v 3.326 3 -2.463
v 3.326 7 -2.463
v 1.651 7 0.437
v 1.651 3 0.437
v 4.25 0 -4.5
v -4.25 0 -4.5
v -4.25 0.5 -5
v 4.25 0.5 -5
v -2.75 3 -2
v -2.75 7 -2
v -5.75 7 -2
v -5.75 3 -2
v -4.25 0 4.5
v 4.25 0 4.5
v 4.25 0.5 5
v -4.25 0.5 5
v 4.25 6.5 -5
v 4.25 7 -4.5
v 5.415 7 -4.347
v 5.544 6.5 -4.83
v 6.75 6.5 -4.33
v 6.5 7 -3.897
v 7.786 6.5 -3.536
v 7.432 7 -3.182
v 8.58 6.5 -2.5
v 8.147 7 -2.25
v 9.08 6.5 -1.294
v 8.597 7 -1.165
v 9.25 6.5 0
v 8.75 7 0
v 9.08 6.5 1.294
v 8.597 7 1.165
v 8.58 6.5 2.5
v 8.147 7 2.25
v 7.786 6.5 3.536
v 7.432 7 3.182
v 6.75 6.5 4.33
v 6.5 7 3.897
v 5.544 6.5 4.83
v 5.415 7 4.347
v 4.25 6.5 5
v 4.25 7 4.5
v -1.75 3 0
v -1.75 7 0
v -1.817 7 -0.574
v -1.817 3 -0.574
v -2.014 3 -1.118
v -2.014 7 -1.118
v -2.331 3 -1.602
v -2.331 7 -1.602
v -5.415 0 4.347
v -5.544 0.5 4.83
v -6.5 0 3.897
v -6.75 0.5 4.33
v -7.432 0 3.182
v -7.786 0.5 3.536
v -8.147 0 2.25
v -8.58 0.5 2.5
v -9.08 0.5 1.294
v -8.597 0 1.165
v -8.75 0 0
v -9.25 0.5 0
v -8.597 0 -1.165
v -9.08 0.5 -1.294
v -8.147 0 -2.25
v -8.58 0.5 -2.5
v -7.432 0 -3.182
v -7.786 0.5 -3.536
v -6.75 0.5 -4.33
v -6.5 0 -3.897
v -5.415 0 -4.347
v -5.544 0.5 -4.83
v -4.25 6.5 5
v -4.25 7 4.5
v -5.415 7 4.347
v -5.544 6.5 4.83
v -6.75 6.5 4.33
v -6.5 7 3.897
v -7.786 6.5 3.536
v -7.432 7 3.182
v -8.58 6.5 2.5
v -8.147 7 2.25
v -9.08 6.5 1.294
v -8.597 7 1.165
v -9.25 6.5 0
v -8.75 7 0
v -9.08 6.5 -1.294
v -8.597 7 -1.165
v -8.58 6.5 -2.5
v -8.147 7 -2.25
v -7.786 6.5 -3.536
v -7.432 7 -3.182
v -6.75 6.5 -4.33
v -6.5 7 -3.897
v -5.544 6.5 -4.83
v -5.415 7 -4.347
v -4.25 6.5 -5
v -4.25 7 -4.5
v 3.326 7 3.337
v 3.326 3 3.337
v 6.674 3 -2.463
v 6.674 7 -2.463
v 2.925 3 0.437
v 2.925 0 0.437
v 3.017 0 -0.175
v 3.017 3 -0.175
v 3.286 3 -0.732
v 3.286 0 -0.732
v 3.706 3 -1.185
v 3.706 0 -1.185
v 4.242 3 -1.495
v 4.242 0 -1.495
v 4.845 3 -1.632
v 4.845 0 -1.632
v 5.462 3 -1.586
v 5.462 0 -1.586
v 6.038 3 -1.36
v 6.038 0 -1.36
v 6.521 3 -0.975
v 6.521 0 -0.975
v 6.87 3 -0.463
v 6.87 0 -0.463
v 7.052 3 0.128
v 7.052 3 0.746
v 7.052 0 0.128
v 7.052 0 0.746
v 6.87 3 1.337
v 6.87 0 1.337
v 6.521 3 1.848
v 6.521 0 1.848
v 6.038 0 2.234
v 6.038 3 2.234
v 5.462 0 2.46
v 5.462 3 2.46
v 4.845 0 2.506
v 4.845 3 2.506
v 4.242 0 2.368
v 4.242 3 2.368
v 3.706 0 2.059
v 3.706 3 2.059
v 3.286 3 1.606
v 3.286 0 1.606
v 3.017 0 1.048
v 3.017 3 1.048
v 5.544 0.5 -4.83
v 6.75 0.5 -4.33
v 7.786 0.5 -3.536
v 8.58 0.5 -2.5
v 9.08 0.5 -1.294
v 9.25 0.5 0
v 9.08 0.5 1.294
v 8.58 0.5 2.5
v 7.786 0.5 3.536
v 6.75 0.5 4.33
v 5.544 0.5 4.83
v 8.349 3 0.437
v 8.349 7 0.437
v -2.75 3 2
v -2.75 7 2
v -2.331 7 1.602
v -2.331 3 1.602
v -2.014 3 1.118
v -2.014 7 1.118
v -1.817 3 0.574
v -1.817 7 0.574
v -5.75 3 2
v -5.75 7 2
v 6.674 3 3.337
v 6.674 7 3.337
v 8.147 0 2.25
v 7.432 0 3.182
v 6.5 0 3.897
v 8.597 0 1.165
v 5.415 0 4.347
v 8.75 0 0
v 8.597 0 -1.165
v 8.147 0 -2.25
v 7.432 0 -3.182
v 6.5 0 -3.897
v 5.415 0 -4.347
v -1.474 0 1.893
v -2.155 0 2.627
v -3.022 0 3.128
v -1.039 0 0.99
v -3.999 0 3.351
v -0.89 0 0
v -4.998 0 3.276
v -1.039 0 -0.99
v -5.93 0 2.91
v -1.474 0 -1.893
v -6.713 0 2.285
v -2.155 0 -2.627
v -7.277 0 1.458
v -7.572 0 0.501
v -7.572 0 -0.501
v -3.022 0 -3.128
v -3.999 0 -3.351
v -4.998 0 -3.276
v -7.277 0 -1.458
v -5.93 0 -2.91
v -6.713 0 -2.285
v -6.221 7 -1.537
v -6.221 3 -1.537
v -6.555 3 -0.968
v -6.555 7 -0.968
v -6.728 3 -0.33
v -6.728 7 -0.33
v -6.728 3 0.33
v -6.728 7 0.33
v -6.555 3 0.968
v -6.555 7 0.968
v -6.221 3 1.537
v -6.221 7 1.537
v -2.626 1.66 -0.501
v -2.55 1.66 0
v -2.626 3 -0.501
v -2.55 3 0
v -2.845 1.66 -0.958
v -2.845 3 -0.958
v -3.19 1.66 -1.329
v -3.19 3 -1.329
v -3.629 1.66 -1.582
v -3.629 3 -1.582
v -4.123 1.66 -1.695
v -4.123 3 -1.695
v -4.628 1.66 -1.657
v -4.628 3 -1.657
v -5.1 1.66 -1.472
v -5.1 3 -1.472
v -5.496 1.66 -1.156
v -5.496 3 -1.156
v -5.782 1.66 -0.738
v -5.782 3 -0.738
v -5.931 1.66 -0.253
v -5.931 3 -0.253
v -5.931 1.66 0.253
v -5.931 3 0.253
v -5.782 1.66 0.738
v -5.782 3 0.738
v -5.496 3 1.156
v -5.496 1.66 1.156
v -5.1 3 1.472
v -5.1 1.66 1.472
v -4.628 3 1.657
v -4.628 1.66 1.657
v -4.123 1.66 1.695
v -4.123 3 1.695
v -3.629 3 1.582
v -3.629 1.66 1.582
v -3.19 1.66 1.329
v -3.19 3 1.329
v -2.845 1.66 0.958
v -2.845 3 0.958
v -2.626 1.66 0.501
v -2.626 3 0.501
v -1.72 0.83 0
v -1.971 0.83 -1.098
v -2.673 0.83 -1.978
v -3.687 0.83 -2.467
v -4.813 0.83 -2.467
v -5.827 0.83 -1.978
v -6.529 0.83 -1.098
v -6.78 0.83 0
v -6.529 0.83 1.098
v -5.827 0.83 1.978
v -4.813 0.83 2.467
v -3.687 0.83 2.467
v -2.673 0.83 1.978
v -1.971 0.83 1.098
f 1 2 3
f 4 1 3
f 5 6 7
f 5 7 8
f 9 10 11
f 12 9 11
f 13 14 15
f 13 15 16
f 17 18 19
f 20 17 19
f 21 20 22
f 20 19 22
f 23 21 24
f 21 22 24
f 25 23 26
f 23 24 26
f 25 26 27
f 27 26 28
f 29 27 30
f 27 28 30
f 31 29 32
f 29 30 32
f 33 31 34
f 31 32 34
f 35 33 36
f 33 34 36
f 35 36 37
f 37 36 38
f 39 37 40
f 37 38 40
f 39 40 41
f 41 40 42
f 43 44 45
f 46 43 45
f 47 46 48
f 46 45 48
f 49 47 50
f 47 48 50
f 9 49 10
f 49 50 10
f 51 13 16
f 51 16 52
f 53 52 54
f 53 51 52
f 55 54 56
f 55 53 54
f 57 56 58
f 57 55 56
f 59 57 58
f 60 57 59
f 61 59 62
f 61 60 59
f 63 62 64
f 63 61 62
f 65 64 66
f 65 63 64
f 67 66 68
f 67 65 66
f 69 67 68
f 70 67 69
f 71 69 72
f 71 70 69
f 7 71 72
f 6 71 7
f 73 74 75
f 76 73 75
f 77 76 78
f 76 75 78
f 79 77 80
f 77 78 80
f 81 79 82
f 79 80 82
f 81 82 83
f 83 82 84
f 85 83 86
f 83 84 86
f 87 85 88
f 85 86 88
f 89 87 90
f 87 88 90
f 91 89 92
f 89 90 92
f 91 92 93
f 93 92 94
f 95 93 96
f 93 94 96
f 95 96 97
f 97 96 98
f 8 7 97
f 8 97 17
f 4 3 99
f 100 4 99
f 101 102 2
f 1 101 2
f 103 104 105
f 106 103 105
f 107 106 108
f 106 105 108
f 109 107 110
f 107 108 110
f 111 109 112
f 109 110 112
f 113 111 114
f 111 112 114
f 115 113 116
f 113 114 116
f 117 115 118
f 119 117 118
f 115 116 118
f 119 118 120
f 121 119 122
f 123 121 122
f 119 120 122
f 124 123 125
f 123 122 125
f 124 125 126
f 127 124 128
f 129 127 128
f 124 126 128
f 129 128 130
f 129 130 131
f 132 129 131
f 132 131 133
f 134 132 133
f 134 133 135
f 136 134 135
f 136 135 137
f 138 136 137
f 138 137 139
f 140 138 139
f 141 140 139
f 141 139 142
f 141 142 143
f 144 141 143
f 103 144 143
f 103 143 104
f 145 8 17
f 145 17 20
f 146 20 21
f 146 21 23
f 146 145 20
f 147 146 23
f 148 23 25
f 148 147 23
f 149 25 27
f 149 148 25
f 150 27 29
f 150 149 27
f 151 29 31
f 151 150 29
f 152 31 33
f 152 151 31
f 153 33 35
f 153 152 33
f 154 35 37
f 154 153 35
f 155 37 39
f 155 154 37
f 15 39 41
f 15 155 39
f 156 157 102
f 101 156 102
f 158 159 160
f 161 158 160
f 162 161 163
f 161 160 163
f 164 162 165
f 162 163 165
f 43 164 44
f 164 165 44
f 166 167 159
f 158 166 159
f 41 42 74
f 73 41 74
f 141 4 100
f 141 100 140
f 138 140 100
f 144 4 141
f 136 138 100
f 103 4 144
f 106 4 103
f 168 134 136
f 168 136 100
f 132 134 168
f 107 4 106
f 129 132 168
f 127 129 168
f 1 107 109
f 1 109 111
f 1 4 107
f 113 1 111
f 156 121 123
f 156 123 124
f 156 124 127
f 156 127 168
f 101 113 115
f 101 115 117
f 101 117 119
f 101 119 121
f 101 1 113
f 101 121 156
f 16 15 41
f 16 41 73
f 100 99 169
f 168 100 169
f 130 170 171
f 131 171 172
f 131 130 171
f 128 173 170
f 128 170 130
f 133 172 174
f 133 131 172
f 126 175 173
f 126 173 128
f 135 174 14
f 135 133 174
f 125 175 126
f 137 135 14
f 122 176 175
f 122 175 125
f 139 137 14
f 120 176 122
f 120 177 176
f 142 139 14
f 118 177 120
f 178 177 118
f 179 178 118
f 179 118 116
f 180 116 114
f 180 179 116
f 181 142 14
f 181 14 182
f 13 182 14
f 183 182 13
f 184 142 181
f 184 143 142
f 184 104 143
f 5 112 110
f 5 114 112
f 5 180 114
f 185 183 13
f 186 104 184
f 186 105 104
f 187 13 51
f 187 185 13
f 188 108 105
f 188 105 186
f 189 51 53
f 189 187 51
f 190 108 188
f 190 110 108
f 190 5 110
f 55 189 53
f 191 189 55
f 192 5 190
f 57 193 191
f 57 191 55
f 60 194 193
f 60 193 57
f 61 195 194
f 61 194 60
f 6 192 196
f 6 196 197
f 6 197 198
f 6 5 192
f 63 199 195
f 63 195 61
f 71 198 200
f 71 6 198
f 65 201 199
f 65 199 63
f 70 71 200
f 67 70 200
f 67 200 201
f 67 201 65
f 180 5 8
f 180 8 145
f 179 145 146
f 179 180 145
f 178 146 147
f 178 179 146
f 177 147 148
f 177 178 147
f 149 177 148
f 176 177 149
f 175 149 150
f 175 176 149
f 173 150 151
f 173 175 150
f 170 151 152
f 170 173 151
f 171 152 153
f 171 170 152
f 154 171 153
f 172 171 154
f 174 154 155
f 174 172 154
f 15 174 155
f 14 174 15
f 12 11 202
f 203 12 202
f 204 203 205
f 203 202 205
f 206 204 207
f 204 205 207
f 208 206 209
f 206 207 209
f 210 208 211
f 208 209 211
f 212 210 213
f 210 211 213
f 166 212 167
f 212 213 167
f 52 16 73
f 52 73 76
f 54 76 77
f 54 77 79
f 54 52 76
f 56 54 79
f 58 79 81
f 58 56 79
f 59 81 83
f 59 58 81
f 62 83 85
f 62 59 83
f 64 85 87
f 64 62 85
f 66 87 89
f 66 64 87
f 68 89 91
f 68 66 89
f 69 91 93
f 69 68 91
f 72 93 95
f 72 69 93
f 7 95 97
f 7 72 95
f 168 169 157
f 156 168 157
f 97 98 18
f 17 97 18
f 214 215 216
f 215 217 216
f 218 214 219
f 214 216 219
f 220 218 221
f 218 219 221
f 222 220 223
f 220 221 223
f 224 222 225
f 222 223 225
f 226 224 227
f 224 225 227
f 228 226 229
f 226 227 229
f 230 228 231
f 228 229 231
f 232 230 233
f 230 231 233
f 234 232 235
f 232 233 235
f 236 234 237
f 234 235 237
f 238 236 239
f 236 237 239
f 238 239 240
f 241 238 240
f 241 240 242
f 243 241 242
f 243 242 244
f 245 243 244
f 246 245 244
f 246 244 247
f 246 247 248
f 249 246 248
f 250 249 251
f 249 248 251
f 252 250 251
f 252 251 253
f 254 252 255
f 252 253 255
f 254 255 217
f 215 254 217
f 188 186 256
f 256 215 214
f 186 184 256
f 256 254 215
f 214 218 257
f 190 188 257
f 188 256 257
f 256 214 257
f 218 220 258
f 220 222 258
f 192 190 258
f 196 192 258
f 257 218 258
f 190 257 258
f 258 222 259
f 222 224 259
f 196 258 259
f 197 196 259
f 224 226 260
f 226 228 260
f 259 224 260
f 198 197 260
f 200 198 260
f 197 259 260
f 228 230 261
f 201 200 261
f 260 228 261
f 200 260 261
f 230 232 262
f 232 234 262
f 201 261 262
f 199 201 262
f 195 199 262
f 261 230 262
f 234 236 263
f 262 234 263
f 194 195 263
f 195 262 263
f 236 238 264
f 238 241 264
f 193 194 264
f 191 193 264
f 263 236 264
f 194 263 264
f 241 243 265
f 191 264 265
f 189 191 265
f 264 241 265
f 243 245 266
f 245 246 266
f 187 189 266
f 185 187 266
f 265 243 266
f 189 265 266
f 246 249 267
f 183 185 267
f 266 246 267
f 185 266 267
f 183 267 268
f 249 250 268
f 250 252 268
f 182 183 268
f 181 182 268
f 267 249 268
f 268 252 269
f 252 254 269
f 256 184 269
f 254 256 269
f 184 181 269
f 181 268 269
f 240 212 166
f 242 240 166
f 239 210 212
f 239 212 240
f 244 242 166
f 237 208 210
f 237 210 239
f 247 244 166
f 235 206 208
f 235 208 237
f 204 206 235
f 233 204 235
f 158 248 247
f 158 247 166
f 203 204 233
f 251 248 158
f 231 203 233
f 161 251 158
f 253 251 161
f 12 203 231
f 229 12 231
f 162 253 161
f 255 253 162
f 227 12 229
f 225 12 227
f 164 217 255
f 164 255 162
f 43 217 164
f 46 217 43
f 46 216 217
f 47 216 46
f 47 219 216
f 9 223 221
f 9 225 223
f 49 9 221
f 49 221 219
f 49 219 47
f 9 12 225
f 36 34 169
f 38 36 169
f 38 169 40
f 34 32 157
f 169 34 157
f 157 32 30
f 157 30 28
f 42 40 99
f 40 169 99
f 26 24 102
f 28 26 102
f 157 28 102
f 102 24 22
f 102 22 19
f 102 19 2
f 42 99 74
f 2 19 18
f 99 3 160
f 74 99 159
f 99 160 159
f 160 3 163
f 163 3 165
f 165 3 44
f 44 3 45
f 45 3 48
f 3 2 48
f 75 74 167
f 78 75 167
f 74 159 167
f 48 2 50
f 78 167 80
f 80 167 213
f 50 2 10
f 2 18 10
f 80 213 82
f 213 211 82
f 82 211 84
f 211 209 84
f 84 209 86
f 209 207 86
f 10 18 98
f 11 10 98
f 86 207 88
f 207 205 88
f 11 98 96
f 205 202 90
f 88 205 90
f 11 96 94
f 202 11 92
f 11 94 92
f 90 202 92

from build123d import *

# Parameters (mm, degrees)
EXTRUDE_1_DEPTH              = 7
CUT_EXTRUDE_1_DEPTH          = 4
HOLE_WIZARD_M3_1_D           = 3.4
HOLE_WIZARD_M3_1_DEPTH       = 7.5
HOLE_WIZARD_M3_1_CSINK_D     = 6.72
HOLE_WIZARD_M3_1_CSINK_ANGLE = 90
HOLE_WIZARD_M3_1_TIP         = 1.021463052
HOLE_WIZARD_1_D              = 4.15
CUT_EXTRUDE_2_DEPTH          = 4
CHAMFER_1_SIZE               = 0.5


with BuildPart() as part:
    # 草图1 → 凸台-拉伸1 (new body)
    with BuildSketch(Plane(origin=(0, 0, 0), x_dir=(1, 0, 0), z_dir=(0, 1, 0))):
        with BuildLine():
            Line((-4.25, 5), (4.25, 5))
            ThreePointArc((4.25, 5), (9.25, 0), (4.25, -5))
            Line((4.25, -5), (-4.25, -5))
            ThreePointArc((-4.25, -5), (-9.25, 0), (-4.25, 5))
        make_face()
    extrude(amount=EXTRUDE_1_DEPTH)

    # 草图2 → 切除-拉伸1 (cut)
    with BuildSketch(Plane(origin=(0, 7, 0), x_dir=(1, 0, 0), z_dir=(0, 1, 0))):
        with BuildLine():
            Line((-2.75, 2), (-5.75, 2))
            ThreePointArc((-5.75, 2), (-6.75, 0), (-5.75, -2))
            Line((-5.75, -2), (-2.75, -2))
            ThreePointArc((-2.75, -2), (-2.013932023, -1.118033989), (-1.75, 0))
            ThreePointArc((-1.75, 0), (-2.013932023, 1.118033989), (-2.75, 2))
        make_face()
    extrude(amount=-CUT_EXTRUDE_1_DEPTH, mode=Mode.SUBTRACT)

    # M3 六角凹锥坑螺钉的锥形沉头孔1
    with Locations(Plane(origin=(0, 0, 0), x_dir=(-1, 0, 0), z_dir=(0, -1, 0))):
        with Locations((4.25, 0)):
            CounterSinkHole(HOLE_WIZARD_M3_1_D / 2, HOLE_WIZARD_M3_1_CSINK_D / 2, depth=HOLE_WIZARD_M3_1_DEPTH, counter_sink_angle=HOLE_WIZARD_M3_1_CSINK_ANGLE)
            with Locations((0, 0, -(HOLE_WIZARD_M3_1_DEPTH + HOLE_WIZARD_M3_1_TIP / 2))):  # 118° drill point
                Cone(0, HOLE_WIZARD_M3_1_D / 2, HOLE_WIZARD_M3_1_TIP, mode=Mode.SUBTRACT)

    # 孔1 (through all)
    with Locations(Plane(origin=(0, 7, 0), x_dir=(1, 0, 0), z_dir=(0, 1, 0))):
        with Locations((5, -0.436816998)):
            Hole(HOLE_WIZARD_1_D / 2)

    # 草图12 → 切除-拉伸2 (cut)
    with BuildSketch(Plane(origin=(0, 7, 0), x_dir=(1, 0, 0), z_dir=(0, 1, 0))):
        Polygon((8.348631561, -0.436816998), (6.674315781, 2.463183002), (3.325684219, 2.463183002), (1.651368439, -0.436816998), (3.325684219, -3.336816998), (6.674315781, -3.336816998), align=None)
    extrude(amount=-CUT_EXTRUDE_2_DEPTH, mode=Mode.SUBTRACT)

    # 倒角1
    chamfer_1_edges = [part.edges().sort_by_distance(p)[0] for p in [
        (9.25, 7, 0),
        (0, 7, -5),
        (-9.25, 7, 0),
        (0, 0, -5),
        (9.25, 0, 0),
        (0, 0, 5),
        (-9.25, 0, 0),
        (0, 7, 5),
    ]]
    chamfer(chamfer_1_edges, length=CHAMFER_1_SIZE)


solid = part.part
